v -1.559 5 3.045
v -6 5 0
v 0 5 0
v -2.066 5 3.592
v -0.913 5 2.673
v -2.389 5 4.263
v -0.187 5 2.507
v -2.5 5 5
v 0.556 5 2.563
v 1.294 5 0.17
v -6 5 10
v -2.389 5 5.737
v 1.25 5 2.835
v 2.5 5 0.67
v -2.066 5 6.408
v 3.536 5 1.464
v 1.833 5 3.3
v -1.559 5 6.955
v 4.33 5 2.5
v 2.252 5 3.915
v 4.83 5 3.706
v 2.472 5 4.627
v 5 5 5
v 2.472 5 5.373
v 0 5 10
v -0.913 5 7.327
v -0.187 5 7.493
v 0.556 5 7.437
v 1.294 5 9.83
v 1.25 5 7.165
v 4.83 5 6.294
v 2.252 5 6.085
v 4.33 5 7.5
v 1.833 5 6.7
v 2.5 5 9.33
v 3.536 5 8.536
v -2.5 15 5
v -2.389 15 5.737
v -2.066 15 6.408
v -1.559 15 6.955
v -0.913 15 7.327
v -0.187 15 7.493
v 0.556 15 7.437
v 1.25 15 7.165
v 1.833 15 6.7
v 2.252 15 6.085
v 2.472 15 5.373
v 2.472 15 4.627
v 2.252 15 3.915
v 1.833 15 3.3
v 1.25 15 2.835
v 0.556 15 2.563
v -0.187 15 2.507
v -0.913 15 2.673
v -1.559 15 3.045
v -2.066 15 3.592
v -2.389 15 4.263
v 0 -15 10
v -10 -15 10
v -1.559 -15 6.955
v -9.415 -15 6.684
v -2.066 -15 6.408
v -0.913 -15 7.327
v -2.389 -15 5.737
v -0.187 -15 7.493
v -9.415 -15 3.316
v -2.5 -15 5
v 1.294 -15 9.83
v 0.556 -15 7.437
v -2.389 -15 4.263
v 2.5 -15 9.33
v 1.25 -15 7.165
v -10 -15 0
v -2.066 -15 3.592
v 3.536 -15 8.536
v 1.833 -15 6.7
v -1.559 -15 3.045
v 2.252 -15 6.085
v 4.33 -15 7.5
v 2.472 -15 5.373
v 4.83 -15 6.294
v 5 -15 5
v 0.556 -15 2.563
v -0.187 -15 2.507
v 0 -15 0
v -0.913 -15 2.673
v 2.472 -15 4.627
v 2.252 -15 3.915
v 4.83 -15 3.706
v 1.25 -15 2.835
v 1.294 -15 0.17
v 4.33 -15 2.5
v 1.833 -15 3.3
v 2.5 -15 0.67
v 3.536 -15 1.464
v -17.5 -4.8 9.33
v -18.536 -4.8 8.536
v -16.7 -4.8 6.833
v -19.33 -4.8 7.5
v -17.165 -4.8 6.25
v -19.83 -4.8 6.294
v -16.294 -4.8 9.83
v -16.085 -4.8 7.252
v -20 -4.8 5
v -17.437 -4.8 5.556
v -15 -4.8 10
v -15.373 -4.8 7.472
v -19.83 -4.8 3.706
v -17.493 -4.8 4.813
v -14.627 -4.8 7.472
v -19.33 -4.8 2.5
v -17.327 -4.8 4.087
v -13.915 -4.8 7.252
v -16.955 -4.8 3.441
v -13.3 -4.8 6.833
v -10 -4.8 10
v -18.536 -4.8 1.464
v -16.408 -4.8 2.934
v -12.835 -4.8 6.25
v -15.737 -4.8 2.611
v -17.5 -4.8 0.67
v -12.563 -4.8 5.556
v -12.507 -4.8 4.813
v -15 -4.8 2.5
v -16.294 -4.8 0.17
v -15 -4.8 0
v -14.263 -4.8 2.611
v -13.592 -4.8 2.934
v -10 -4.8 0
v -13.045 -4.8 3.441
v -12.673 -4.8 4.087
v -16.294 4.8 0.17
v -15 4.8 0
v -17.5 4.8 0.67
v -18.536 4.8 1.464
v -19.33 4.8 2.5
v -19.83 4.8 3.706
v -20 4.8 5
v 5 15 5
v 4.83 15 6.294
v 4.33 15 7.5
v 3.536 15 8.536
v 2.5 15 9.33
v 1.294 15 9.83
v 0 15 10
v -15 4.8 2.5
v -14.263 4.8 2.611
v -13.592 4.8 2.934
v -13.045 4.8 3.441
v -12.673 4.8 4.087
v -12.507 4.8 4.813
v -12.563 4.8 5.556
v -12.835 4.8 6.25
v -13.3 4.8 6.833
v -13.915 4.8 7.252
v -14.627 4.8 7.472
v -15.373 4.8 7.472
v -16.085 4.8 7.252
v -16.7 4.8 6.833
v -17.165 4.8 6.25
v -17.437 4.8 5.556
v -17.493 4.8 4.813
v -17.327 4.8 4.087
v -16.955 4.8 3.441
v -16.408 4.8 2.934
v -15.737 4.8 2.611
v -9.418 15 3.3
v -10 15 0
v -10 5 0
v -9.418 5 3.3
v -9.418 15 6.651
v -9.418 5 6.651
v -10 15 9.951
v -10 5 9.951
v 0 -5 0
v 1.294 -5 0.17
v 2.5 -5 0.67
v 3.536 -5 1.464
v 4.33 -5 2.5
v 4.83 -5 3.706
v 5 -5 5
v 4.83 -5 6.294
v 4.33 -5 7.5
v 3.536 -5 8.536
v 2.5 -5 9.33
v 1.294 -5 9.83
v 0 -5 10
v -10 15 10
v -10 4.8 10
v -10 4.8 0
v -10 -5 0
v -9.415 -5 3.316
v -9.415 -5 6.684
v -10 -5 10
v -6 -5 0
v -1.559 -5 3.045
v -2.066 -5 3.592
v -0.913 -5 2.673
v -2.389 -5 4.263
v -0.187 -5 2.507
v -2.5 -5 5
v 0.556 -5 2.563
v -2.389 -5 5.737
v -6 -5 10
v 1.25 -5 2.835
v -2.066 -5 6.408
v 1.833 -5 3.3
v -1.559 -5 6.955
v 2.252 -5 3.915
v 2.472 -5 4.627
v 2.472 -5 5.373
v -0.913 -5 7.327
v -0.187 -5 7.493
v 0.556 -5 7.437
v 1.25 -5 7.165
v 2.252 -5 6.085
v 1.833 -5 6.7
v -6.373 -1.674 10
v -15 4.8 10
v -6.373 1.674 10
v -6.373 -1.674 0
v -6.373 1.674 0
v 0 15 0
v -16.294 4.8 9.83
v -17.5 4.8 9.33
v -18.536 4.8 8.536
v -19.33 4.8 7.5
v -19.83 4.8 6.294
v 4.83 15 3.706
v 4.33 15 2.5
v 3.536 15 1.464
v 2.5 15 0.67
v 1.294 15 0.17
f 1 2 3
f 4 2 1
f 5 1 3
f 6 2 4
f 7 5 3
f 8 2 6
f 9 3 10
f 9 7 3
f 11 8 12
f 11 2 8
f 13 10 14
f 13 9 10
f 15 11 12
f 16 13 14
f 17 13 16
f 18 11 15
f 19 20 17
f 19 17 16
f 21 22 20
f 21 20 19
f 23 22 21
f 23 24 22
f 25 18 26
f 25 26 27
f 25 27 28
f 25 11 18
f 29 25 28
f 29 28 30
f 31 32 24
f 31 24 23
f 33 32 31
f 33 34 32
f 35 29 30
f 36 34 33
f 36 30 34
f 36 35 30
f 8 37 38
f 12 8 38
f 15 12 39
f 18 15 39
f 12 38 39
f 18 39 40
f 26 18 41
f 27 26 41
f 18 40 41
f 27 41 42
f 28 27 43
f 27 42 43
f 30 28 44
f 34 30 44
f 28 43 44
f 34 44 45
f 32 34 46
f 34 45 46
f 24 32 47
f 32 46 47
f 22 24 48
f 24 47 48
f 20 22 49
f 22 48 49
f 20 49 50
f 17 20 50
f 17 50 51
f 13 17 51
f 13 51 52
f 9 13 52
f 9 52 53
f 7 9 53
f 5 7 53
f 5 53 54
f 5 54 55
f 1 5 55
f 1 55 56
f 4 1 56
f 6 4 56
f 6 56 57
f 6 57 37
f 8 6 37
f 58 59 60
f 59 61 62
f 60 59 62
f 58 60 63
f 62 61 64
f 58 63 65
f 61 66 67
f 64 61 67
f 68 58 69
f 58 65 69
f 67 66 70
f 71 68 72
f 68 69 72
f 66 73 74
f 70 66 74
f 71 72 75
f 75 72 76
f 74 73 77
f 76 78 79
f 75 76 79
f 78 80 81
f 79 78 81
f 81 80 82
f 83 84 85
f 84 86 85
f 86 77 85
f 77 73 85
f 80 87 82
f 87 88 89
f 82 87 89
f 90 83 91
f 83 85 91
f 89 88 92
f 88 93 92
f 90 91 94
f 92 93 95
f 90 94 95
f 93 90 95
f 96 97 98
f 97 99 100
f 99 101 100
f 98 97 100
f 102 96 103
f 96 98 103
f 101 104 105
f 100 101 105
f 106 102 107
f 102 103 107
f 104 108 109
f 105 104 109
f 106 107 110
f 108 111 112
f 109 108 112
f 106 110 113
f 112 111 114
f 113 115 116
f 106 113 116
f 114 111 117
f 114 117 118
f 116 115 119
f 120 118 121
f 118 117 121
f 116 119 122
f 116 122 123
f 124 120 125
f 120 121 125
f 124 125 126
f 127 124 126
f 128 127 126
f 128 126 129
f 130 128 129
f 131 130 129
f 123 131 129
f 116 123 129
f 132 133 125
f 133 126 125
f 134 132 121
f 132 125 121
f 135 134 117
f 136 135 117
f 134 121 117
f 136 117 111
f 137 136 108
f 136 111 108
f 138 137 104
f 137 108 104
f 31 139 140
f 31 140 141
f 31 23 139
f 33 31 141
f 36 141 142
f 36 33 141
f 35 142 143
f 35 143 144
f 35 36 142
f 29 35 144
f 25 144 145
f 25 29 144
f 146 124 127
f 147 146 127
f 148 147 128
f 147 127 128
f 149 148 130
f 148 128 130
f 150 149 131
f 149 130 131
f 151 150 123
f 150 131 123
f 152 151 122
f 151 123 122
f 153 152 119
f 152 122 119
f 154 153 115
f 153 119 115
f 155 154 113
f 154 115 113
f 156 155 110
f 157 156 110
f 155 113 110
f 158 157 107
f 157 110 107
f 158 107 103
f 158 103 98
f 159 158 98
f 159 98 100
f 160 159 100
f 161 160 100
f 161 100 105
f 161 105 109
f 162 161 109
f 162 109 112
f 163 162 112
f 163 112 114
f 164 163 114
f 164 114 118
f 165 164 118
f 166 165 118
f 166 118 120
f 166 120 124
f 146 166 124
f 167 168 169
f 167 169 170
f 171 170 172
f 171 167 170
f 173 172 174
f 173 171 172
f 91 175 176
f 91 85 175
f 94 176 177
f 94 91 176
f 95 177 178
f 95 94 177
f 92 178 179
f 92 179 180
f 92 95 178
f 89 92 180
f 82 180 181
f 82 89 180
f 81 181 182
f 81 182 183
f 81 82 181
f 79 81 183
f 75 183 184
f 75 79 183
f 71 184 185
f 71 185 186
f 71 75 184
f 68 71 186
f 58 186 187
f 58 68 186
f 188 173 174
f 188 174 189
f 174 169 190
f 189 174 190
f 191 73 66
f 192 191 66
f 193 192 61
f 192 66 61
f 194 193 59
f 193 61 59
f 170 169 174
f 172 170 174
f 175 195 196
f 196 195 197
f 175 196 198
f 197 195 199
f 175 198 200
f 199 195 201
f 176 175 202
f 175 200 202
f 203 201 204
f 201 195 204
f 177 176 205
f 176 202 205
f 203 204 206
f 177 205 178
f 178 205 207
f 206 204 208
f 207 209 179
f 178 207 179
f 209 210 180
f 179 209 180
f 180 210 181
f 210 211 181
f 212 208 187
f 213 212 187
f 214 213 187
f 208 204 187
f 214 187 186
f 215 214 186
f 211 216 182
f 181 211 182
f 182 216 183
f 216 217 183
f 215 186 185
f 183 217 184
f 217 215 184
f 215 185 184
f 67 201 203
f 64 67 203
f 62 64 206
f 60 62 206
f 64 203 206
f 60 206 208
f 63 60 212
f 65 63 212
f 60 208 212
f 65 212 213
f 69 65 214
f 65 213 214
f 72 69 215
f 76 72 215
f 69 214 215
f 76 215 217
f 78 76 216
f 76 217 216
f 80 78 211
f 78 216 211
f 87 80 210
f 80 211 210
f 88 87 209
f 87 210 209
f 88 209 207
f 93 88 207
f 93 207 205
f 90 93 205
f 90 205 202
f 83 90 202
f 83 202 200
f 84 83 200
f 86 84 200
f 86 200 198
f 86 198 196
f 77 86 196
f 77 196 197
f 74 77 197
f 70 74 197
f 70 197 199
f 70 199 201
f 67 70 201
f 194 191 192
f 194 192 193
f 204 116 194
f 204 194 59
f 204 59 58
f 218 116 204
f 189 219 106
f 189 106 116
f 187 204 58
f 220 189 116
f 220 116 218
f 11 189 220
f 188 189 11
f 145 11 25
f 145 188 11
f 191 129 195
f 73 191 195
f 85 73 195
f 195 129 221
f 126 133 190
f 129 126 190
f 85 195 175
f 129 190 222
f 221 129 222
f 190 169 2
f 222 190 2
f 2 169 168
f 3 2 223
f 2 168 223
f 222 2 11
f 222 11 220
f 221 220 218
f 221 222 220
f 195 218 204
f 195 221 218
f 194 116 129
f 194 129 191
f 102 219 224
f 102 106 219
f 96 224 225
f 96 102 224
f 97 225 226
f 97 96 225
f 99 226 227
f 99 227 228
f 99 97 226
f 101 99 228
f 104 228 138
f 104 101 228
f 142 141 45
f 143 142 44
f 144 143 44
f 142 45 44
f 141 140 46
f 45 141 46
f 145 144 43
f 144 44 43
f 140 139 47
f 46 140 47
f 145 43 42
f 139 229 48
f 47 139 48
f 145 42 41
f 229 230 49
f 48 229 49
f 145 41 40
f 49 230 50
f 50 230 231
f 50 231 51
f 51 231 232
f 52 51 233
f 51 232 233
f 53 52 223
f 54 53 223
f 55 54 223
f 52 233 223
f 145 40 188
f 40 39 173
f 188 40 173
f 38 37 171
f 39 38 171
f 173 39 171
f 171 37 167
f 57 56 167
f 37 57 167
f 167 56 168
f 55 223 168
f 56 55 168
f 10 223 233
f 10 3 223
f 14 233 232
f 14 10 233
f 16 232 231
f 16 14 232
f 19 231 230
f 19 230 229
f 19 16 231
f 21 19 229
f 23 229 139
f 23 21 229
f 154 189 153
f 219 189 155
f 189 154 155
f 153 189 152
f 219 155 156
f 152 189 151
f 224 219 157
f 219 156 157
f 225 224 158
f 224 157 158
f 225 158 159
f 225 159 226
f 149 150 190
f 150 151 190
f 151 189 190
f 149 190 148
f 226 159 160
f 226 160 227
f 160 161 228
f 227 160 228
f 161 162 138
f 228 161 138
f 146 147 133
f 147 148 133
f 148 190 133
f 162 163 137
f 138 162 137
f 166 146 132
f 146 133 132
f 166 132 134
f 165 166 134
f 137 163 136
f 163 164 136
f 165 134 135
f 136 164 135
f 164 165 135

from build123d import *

# Parameters (mm, degrees)
RESSALTO_EXTRUS_O1_DEPTH = 10
ESBO_O2_R                = 2.5
CORTE_EXTRUS_O1_DEPTH    = 10
FILETE1_R                = 5
CORTE_EXTRUS_O4_DEPTH    = 10
CORTE_EXTRUS_O5_DEPTH    = 10
CORTE_EXTRUS_O6_REACH    = 39.417
ESBO_O7_W                = 15
ESBO_O7_H                = 10
ESBO_O8_W                = 11
ESBO_O8_H                = 10
CORTE_EXTRUS_O7_DEPTH    = 27.925824036
CORTE_EXTRUS_O8_DEPTH    = 20
CORTE_EXTRUS_O9_REACH    = 39.417
ESBO_O10_R               = 2.5
FILETE2_R                = 5


with BuildPart() as part:
    # Esboço1 → Ressalto-extrusão1 (new body)
    with BuildSketch(Plane.XY):
        Polygon((-10, -7.5), (20, 15), (-10, 15), (-10, 4.8), (-20, 4.8), (-20, -4.8), (-10, -4.8), align=None)
        Polygon((20, -15), (20, 15), (-10, -7.5), (-10, -15), align=None)
    extrude(amount=RESSALTO_EXTRUS_O1_DEPTH)

    # Esboço2 → Corte-extrusão1 (cut)
    with BuildSketch(Plane.XZ.offset(4.8)):
        with Locations(Location((-15, 5, 0), (0, 0, 270))):
            Circle(ESBO_O2_R)
    extrude(amount=-CORTE_EXTRUS_O1_DEPTH, mode=Mode.SUBTRACT)

    # Filete1
    filete1_edges = [part.edges().sort_by_distance(p)[0] for p in [
        (-20, 0, 0),
        (-20, 0, 10),
    ]]
    fillet(filete1_edges, radius=FILETE1_R - 0.0001)  # a hair under: the kernel refuses the full size

    # Esboço5 → Corte-extrusão4 (cut)
    with BuildSketch(Plane.XZ.offset(15)):
        with BuildLine():
            Line((-10, 10), (-10, 0))
            ThreePointArc((-10, 0), (-9.341737512, 5), (-10, 10))
        make_face()
    extrude(amount=-CORTE_EXTRUS_O4_DEPTH, mode=Mode.SUBTRACT)

    # Esboço6 → Corte-extrusão5 (cut)
    with BuildSketch(Plane(origin=(0, 15, 0), x_dir=(1, 0, 0), z_dir=(0, 1, 0))):
        with BuildLine():
            Line((-10, -9.950546275), (-10, 0))
            ThreePointArc((-10, 0), (-9.344992865, -4.975273137), (-10, -9.950546275))
        make_face()
    extrude(amount=-CORTE_EXTRUS_O5_DEPTH, mode=Mode.SUBTRACT)

    # Esboço7 → Corte-extrusão6 (cut, up to next)
    with BuildSketch(Plane(origin=(0, 15, 0), x_dir=(1, 0, 0), z_dir=(0, 1, 0)), mode=Mode.PRIVATE) as corte_extrus_o6_sk1:
        with Locations((12.5, -5)):
            Rectangle(ESBO_O7_W, ESBO_O7_H)
    corte_extrus_o6_tool1 = extrude(corte_extrus_o6_sk1.sketch, amount=-CORTE_EXTRUS_O6_REACH, mode=Mode.PRIVATE) & part.part
    add(corte_extrus_o6_tool1.solids().sort_by_distance((12.5, 15, 5))[0], mode=Mode.SUBTRACT)

    # Esboço8 → Corte-extrusão7 (cut, through all)
    with BuildSketch(Plane.XY.offset(10)):
        with Locations((-0.5, 0)):
            Rectangle(ESBO_O8_W, ESBO_O8_H)
    extrude(amount=-CORTE_EXTRUS_O7_DEPTH, mode=Mode.SUBTRACT)

    # Esboço9 → Corte-extrusão8 (cut)
    with BuildSketch(Plane(origin=(0, 0, 0), x_dir=(-1, 0, 0), z_dir=(0, 0, -1))):
        with BuildLine():
            Line((6, -5), (6, 5))
            ThreePointArc((6, 5), (6.419601085, 0), (6, -5))
        make_face()
    extrude(amount=-CORTE_EXTRUS_O8_DEPTH, mode=Mode.SUBTRACT)

    # Corte-extrusão9: up to this face of the body (flat: up to its plane)
    corte_extrus_o9_end = Plane(part.part.faces().sort_by_distance((-2.281136508, -15, 5))[0])
    # Esboço10 → Corte-extrusão9 (cut, up to the picked face)
    with BuildSketch(Plane(origin=(0, 15, 0), x_dir=(1, 0, 0), z_dir=(0, 1, 0)), mode=Mode.PRIVATE) as corte_extrus_o9_sk1:
        with Locations(Location((0, -5, 0), (0, 0, 180))):
            Circle(ESBO_O10_R)
    corte_extrus_o9_tool1 = split(extrude(corte_extrus_o9_sk1.sketch, amount=-CORTE_EXTRUS_O9_REACH, mode=Mode.PRIVATE), bisect_by=corte_extrus_o9_end, keep=Keep.BOTH, mode=Mode.PRIVATE)
    add(corte_extrus_o9_tool1.solids().sort_by(Axis((0, 15, 5), (0, -1, 0)))[0], mode=Mode.SUBTRACT)

    # Filete2
    filete2_edges = [part.edges().sort_by_distance(p)[0] for p in [
        (5, -10, 0),
        (5, -10, 10),
        (5, 10, 10),
        (5, 10, 0),
    ]]
    fillet(filete2_edges, radius=FILETE2_R - 0.0001)  # a hair under: the kernel refuses the full size


solid = part.part
